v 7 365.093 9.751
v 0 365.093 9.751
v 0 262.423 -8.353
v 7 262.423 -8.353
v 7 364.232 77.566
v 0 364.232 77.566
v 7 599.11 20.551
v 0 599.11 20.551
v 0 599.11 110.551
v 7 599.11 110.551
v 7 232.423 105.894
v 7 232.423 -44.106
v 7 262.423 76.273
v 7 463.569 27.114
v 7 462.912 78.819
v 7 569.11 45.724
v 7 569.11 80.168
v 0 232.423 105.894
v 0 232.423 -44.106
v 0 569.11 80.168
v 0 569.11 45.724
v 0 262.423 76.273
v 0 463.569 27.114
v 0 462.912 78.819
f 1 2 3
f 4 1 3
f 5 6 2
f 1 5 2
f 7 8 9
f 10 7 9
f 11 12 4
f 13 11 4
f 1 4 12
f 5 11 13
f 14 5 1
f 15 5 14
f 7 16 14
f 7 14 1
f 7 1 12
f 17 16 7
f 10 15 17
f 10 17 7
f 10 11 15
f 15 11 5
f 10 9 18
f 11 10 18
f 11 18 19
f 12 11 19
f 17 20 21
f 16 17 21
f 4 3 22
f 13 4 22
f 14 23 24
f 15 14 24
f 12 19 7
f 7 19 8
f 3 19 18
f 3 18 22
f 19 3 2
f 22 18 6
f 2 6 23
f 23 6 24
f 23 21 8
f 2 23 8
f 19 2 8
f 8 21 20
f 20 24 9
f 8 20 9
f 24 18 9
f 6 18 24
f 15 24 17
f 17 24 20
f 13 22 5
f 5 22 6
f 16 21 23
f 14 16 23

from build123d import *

# Parameters (mm, degrees)
F1_DEPTH = 7


with BuildPart() as f1:
    # F0 (on Right) → F1 (new body)
    with BuildSketch(Plane.YZ):
        Polygon((599.109616, 110.551124), (232.423452, 105.89446), (232.423452, -44.10554), (599.109616, 20.551124), align=None)
        Polygon((262.423452, -8.352933), (262.423452, 76.27302), (364.232124, 77.565921), (365.093333, 9.750538), align=None, mode=Mode.SUBTRACT)
        Polygon((462.911965, 78.819088), (569.109616, 80.167725), (569.109616, 45.724113), (463.56858, 27.114381), align=None, mode=Mode.SUBTRACT)
    extrude(amount=F1_DEPTH)


solid = f1.part
